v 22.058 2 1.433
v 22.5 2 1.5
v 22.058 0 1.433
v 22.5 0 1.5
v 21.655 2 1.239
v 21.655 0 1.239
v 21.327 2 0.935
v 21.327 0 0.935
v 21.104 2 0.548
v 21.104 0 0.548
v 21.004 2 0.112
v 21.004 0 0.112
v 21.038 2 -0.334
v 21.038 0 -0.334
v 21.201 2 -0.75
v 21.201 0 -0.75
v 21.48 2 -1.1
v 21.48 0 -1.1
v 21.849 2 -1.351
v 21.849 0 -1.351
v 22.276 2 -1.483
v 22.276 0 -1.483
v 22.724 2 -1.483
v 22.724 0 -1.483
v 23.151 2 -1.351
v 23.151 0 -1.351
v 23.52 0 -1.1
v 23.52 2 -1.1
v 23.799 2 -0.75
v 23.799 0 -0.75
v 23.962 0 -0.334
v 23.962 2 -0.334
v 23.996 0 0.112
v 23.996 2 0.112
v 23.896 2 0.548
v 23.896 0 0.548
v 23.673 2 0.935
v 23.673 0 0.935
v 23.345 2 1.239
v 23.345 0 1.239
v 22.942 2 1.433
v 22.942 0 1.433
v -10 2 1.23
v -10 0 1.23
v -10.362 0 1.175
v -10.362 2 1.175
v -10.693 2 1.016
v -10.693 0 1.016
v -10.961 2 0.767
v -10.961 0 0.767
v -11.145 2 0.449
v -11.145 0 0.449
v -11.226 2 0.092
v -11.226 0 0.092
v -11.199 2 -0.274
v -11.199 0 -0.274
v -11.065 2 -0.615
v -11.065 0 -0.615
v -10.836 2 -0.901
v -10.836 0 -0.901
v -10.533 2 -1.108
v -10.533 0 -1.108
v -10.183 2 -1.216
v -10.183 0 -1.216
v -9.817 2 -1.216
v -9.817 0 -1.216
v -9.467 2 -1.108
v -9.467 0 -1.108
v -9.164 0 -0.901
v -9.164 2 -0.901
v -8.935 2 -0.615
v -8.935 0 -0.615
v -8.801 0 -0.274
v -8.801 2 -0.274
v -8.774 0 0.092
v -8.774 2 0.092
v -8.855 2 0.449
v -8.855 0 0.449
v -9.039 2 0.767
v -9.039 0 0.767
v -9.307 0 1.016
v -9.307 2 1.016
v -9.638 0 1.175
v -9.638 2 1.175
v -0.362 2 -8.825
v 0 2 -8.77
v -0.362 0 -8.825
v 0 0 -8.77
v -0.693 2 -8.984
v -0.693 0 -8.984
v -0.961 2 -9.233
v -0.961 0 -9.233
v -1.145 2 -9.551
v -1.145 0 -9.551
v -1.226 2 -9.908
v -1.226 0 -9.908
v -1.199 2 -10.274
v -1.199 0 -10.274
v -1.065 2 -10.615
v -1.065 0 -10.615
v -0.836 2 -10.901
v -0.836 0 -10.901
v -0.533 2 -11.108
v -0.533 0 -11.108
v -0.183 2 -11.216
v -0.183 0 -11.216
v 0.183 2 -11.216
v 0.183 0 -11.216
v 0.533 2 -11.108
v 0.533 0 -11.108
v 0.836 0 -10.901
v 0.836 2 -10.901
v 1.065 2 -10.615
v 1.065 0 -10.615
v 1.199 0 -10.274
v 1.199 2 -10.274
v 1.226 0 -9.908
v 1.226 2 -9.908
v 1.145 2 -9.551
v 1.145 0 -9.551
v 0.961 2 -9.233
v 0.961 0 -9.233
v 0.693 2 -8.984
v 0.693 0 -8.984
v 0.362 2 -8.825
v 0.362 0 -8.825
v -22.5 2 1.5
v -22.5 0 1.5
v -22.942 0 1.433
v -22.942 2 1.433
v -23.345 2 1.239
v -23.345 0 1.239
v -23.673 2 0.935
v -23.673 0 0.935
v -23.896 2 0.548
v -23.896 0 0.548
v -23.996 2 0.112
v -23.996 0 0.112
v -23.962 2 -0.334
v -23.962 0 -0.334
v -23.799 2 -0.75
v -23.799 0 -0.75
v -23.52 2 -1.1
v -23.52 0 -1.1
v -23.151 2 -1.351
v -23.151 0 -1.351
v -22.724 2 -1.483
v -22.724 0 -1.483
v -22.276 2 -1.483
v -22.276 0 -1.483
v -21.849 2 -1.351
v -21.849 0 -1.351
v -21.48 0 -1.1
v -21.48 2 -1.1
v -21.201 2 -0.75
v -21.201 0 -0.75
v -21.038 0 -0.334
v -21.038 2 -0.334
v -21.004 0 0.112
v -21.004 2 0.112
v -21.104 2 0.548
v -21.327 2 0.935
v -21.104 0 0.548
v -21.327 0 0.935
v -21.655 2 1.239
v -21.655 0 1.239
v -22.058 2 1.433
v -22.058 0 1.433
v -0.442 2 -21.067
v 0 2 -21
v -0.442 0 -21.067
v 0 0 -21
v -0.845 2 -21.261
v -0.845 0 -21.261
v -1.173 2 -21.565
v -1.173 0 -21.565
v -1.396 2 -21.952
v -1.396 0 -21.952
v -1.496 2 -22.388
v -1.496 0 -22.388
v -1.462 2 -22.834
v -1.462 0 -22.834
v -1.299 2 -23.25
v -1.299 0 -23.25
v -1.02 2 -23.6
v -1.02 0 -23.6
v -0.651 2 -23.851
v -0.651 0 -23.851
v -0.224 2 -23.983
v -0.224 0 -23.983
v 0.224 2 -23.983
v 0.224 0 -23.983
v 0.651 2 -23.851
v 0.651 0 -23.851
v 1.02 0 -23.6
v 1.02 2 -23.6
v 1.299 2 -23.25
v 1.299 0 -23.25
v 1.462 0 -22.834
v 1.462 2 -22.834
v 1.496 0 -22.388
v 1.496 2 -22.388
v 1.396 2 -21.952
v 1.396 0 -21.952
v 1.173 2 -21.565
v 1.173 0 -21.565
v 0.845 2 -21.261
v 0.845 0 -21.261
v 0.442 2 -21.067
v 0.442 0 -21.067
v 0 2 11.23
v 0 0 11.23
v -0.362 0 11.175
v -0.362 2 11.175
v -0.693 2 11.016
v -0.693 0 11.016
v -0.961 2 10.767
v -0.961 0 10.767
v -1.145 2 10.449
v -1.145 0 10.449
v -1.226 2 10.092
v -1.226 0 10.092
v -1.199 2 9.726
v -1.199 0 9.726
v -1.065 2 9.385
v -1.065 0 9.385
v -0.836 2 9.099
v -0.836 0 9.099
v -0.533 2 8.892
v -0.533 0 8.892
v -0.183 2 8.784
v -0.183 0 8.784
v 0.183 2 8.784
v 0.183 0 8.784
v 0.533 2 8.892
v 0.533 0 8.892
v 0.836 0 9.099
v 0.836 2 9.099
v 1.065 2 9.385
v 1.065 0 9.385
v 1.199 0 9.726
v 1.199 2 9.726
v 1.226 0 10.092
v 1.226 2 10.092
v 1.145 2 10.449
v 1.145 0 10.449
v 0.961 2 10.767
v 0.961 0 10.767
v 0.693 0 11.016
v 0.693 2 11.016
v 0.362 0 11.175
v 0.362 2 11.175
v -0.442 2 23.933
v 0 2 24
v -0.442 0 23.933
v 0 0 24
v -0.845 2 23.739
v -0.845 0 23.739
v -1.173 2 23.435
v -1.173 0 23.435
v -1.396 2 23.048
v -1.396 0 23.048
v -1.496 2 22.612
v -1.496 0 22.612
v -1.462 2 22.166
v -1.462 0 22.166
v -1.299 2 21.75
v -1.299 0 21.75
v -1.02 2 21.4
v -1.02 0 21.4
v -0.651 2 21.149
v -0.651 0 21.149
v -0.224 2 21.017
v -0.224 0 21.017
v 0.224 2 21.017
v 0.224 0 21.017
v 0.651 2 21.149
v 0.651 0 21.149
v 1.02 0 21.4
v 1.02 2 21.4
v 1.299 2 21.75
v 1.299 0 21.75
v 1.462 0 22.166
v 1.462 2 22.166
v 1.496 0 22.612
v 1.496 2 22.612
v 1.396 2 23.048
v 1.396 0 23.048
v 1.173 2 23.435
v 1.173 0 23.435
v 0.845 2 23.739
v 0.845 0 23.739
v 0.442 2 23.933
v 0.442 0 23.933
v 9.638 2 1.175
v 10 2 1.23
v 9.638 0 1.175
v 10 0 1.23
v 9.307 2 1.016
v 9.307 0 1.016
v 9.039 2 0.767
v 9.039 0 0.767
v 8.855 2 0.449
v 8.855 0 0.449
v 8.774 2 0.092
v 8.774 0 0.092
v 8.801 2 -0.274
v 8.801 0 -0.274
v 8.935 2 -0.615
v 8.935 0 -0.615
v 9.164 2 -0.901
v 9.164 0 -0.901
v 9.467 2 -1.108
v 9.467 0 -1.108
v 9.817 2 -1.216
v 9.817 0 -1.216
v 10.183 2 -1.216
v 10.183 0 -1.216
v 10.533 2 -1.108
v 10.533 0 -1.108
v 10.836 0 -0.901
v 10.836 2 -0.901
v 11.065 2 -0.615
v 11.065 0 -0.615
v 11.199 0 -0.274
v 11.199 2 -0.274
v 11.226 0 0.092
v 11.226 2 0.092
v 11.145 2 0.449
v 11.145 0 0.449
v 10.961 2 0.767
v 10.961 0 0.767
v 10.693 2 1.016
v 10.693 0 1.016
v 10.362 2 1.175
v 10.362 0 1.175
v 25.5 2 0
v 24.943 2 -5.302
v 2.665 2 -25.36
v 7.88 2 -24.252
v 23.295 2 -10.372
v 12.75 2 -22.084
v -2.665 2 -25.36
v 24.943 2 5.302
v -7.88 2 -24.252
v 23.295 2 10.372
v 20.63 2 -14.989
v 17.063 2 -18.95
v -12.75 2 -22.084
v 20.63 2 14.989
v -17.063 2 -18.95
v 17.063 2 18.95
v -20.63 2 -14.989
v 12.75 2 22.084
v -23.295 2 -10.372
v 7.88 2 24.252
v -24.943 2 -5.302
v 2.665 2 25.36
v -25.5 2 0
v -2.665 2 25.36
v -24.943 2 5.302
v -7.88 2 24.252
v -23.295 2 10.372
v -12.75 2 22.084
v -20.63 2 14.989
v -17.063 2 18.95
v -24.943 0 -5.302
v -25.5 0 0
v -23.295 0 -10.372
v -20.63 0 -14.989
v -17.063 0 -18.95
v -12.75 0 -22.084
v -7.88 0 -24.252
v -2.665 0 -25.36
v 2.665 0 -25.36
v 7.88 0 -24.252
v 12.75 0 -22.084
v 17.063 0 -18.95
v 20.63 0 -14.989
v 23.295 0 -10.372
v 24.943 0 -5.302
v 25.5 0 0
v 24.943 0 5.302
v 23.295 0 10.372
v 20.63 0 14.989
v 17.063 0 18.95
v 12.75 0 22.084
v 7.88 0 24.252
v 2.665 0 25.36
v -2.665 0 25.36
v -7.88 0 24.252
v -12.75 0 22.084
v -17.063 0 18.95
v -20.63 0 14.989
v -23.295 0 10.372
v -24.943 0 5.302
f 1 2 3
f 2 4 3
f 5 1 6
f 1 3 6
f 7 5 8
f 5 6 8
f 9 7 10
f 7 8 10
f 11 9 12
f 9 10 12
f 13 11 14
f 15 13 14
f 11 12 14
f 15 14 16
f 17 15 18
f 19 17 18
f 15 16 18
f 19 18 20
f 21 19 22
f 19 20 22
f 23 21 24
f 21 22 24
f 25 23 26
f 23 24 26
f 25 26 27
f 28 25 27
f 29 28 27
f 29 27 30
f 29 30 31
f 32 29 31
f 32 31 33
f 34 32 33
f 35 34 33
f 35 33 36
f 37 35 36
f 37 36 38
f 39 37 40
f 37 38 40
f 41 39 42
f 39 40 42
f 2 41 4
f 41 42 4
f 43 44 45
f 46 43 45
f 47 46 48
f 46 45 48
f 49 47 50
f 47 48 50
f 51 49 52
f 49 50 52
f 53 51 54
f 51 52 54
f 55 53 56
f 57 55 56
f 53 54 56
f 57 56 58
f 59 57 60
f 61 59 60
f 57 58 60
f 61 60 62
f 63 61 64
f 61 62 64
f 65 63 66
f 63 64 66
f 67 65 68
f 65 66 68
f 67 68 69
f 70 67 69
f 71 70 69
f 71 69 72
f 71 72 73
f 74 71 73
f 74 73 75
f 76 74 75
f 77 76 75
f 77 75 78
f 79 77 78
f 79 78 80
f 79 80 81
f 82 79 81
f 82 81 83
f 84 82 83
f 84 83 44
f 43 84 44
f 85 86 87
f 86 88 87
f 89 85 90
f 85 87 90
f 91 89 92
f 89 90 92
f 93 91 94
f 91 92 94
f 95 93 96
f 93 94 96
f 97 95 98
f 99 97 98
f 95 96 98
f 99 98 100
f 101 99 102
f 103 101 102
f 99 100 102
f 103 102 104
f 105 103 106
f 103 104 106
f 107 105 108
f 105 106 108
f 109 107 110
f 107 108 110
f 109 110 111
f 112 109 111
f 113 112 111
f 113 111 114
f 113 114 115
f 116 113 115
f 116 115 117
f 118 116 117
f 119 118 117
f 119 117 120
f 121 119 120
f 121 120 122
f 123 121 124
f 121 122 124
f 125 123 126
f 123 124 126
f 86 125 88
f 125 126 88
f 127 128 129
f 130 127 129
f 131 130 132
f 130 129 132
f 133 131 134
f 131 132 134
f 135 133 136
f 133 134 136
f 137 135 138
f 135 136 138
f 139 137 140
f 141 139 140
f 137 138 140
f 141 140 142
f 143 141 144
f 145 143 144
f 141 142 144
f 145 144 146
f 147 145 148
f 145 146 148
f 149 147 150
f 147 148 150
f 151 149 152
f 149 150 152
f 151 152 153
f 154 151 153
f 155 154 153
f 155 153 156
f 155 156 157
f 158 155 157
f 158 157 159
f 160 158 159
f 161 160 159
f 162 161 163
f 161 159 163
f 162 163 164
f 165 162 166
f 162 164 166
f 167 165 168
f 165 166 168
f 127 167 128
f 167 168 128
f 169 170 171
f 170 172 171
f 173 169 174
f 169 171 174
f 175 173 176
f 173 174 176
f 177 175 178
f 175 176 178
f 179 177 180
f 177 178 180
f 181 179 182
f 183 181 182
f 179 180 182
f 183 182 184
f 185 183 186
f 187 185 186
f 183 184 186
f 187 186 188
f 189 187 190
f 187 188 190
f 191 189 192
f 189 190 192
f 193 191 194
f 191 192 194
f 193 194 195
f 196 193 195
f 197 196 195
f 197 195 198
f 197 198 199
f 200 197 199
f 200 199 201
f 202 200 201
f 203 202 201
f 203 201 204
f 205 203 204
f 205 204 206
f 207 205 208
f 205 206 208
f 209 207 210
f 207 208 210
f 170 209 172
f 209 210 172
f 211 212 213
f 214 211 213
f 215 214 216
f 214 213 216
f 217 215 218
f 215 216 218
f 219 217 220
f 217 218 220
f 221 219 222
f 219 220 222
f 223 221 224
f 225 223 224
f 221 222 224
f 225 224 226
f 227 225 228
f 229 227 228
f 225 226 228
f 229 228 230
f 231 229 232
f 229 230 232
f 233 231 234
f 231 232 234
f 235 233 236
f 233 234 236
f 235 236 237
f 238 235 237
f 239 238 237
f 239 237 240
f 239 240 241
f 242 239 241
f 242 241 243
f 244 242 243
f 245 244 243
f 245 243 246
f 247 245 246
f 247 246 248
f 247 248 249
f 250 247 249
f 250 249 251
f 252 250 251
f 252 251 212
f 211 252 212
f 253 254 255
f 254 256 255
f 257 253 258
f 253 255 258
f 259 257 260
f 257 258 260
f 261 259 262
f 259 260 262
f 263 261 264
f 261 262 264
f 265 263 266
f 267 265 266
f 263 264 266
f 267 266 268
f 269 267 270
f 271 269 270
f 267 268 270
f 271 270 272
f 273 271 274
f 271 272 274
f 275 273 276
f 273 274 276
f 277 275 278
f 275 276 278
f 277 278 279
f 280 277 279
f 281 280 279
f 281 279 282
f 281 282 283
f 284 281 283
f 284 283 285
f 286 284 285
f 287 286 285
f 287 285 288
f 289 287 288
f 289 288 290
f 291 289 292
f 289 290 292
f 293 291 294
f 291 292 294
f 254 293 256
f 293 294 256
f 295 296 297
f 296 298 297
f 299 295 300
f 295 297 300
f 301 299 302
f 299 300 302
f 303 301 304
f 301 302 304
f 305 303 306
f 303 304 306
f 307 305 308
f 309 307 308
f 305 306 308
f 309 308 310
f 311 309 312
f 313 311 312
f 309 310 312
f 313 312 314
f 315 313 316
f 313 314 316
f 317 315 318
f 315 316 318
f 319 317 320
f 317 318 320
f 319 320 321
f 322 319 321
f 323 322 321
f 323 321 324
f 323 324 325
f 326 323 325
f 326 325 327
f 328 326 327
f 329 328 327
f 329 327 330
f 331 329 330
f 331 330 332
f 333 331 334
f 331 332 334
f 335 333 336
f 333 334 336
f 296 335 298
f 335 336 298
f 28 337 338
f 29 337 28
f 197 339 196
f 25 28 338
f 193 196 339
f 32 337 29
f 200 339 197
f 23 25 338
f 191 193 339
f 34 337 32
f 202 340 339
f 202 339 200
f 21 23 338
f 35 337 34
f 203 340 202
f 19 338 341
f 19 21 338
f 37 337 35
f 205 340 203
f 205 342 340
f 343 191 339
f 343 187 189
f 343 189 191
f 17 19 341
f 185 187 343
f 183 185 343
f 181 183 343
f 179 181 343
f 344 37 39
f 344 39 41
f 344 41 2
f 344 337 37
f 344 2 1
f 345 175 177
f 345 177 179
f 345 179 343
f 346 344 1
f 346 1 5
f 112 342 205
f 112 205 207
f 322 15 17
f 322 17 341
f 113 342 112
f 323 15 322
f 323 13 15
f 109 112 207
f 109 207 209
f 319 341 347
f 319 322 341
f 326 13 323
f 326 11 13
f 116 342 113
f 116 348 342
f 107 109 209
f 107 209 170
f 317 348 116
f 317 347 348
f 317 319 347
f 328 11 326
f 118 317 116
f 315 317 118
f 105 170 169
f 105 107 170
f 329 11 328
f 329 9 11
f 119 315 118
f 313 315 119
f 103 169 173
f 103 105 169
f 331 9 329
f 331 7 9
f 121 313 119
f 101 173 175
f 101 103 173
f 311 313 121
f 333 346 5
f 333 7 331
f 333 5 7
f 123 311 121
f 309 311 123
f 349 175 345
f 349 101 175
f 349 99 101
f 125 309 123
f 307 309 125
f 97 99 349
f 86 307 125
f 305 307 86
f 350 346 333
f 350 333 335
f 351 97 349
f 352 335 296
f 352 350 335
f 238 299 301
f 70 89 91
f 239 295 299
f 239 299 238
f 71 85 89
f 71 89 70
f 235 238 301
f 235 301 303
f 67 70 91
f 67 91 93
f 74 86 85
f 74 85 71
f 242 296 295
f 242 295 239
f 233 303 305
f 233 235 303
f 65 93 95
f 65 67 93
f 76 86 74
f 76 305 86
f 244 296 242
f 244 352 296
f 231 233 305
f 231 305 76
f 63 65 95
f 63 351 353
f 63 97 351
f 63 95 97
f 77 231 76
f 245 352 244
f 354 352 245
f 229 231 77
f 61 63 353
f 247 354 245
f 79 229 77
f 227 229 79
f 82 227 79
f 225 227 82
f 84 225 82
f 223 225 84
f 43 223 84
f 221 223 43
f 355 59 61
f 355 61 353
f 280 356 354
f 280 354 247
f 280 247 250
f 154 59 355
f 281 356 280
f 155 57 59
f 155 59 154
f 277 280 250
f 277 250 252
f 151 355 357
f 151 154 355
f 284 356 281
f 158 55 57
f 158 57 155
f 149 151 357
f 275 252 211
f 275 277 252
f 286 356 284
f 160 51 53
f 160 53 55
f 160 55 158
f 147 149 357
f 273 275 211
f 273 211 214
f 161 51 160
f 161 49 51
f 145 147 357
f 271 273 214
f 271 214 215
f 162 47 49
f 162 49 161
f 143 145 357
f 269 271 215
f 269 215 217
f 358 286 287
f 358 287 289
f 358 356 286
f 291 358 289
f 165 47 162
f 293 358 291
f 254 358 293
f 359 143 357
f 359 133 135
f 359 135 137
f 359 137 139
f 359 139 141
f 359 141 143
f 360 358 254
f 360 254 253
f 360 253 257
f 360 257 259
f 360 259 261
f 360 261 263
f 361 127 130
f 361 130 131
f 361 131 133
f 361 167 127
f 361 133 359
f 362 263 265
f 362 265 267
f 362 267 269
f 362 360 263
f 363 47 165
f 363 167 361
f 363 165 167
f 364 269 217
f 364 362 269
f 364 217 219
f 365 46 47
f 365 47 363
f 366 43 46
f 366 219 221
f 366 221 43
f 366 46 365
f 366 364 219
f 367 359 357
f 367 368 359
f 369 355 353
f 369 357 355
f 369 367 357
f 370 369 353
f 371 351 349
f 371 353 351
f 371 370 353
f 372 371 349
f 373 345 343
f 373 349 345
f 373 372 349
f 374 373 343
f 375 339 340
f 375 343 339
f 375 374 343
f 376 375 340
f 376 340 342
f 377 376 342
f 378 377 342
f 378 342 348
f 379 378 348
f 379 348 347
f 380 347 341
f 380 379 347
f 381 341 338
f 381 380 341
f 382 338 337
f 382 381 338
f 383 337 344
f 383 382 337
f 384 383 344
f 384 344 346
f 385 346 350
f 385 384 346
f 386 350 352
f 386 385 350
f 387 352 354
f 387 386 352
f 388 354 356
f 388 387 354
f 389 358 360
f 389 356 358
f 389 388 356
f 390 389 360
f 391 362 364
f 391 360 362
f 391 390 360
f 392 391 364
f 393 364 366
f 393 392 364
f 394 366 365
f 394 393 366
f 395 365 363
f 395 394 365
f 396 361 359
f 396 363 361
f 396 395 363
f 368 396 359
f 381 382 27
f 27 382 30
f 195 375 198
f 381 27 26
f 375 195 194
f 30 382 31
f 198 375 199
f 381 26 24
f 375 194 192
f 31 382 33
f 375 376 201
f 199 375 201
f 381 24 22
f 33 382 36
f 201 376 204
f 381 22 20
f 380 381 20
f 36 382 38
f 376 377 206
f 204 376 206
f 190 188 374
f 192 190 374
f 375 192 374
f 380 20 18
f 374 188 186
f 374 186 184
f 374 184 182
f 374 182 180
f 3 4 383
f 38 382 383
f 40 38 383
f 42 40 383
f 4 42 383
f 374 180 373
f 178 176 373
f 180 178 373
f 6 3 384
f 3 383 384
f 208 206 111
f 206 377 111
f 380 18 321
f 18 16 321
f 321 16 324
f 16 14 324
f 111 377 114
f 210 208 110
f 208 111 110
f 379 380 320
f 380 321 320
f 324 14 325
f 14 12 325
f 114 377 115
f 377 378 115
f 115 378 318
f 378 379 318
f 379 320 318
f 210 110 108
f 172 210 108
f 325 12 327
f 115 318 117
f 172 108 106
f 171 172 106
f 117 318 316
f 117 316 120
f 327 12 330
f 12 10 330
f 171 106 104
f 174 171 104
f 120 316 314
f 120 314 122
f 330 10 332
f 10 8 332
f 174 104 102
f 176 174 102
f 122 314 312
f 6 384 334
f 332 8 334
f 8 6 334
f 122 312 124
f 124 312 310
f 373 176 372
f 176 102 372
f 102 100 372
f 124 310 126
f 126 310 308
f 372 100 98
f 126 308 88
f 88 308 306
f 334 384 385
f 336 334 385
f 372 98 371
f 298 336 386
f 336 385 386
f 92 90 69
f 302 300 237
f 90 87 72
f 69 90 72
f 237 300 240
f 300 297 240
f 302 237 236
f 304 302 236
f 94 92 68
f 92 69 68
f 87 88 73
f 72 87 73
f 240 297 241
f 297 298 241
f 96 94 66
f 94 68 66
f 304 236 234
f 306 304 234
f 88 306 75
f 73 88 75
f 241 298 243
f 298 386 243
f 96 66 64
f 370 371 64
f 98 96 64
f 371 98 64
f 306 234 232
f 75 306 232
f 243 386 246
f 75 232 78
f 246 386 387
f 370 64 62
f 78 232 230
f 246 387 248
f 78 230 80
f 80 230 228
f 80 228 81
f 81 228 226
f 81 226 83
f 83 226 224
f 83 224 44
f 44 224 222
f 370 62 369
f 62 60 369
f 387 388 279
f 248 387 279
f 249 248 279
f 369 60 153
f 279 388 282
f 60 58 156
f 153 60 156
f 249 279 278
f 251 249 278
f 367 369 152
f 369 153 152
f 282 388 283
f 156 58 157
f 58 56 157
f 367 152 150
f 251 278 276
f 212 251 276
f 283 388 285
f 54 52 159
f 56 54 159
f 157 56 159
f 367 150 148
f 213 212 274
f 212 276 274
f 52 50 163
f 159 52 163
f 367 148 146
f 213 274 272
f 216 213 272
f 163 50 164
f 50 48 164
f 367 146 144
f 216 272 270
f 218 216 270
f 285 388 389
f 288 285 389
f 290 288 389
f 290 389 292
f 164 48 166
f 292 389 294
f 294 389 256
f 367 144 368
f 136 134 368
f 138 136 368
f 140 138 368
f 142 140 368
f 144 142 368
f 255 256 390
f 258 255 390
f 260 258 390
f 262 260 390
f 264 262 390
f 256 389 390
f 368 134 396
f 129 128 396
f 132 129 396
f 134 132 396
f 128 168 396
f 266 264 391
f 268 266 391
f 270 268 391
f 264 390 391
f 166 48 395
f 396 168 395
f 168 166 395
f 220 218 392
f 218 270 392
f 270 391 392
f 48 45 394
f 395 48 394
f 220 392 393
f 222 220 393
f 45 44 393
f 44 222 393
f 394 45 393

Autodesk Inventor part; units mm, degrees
ref_plane "YZ Plane" through (0, 0, 0) normal (1, 0, 0) x (0, 1, 0)
ref_plane "XZ Plane" through (0, 0, 0) normal (0, 1, 0) x (-1, 0, 0)
ref_plane "XY Plane" through (0, 0, 0) normal (0, 0, 1) x (1, 0, 0)
sketch "Sketch1" plane through (0, 0, 0) normal (0, 1, 0) x (-1, 0, 0)
  point P0 (0, 0)
sketch "Sketch2" plane through (0, 0, 0) normal (0, 1, 0) x (-1, 0, 0)
  circle A0 centre (0, 0) radius 25.5
  dimension "d0" = 51
extrude "Extrusion1" add sketch "Sketch2" along normal blind 2
sketch "Sketch3" plane through (0, 2, 0) normal (0, 1, 0) x (1, 0, 0)
  circle A0 centre (0, 0) radius 22.5
  line L0 (-35.7, 0) -> (35.7, 0) projected
  line L1 (0, 35.7) -> (0, -35.7) projected
  point P0 (-22.5, 0)
  point P1 (0, -22.5)
  point P2 (22.5, 0)
  point P3 (0, 22.5)
  dimension "d3" = 45
hole "Hole1" at (-22.5, 2, 0) at (0, 2, 22.5) at (22.5, 2, 0) at (0, 2, -22.5) direction (0, -1, 0) diameter 3 end through all
sketch "Sketch4" plane through (0, 2, 0) normal (0, 1, 0) x (1, 0, 0)
  circle A0 centre (0, 0) radius 10
  point P0 (0, -10)
  point P1 (10, 0)
  point P2 (0, 10)
  point P3 (-10, 0)
  dimension "d11" = 20
hole "Hole2" at (-10, 2, 0) at (0, 2, 10) at (10, 2, 0) at (0, 2, -10) direction (0, -1, 0) diameter 2.459 end through all thread size "M3x0.5" class "6H" standard "ANSI Metric M Profile"
properties part number "판"
